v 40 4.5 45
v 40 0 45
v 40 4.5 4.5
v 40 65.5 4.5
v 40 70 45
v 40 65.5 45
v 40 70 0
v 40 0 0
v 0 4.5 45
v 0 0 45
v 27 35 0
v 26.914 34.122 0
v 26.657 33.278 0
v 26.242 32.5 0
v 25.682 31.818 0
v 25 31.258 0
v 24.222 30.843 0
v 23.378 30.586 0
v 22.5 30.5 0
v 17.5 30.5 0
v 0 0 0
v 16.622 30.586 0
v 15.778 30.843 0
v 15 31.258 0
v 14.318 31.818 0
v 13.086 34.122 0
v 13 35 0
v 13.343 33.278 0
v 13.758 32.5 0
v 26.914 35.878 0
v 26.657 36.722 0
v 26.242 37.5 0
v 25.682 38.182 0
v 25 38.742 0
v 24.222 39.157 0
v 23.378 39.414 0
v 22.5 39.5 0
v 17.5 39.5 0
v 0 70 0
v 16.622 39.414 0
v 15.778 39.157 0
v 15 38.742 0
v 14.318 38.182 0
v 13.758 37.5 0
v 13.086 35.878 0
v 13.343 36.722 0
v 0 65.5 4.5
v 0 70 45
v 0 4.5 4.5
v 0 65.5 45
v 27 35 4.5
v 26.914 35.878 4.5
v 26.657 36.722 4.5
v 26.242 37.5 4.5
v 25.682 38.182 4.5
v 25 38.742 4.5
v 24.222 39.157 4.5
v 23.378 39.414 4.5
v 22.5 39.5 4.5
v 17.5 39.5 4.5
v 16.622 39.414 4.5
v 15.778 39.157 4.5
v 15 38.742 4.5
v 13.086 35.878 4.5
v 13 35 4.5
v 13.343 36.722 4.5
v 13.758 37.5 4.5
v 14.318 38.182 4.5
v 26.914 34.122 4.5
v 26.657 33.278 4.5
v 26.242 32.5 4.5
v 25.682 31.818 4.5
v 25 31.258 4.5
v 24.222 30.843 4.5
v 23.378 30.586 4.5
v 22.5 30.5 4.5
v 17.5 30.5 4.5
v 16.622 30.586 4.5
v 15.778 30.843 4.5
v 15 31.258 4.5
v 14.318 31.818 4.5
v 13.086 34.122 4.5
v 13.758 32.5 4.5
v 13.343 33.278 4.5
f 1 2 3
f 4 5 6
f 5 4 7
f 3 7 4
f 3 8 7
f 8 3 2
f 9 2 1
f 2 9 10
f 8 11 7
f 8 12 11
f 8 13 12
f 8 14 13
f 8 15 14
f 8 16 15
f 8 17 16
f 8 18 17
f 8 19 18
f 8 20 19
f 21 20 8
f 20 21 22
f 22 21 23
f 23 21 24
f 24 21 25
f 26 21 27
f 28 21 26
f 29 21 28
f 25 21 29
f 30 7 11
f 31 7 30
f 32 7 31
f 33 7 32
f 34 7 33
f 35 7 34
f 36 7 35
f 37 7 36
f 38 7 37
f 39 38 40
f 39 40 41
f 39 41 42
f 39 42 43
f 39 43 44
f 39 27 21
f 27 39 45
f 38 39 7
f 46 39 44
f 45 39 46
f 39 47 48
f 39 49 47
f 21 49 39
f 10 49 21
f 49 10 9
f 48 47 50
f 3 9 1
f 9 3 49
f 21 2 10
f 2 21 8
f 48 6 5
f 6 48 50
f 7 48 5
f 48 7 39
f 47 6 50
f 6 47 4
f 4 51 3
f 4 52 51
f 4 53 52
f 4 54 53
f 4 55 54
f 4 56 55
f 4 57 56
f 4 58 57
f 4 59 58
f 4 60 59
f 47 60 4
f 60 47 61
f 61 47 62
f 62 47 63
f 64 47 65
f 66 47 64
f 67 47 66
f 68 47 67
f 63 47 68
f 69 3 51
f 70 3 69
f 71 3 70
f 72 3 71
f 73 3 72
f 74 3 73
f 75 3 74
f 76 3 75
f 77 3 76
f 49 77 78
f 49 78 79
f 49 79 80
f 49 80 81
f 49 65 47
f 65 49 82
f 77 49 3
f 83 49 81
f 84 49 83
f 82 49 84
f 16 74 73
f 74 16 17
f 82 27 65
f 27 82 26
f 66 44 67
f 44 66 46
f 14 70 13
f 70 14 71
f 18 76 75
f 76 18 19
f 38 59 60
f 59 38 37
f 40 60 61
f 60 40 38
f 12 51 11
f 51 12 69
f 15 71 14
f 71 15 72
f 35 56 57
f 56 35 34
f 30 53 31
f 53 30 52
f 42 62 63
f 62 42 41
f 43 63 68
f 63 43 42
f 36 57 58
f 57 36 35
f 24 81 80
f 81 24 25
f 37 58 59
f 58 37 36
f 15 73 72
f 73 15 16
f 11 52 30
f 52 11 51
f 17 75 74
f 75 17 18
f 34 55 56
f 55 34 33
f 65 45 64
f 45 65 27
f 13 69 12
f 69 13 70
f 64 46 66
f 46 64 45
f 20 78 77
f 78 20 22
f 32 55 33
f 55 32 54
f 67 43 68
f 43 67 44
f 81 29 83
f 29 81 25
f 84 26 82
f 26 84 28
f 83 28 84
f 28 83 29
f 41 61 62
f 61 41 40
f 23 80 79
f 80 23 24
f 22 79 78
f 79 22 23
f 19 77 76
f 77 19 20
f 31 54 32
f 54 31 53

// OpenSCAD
$fn = 32;

// ----------------------------------------------------------------------
// U-bracket: 40 x 70 x 45 mm
// ----------------------------------------------------------------------

// --- parameters (mm) ---
rail_len = 40;            // outer length, X
jaw_w = 70;               // outer width, Y
jaw_h = 45;               // upright height, Z
web_t = 4.5;              // wall thickness
hole_d = 9;               // clearance for M8
slot_l = 14;              // slot length

module hole_z(px, py) {
  translate([px, py, -2.5]) cylinder(h = web_t + 5, d = hole_d);
}
module hole_y_pz(pz) {
  /* through both uprights along Y */
  translate([0, -2.5, pz]) rotate([-90, 0, 0]) cylinder(h = jaw_w + 5, d = hole_d);
}
module slot_z(px, py) {
  hull() {
    translate([px - (slot_l - hole_d) / 2, py, -2.5]) cylinder(h = web_t + 5, d = hole_d);
    translate([px + (slot_l - hole_d) / 2, py, -2.5]) cylinder(h = web_t + 5, d = hole_d);
  }
}

module base() {
  cube([rail_len, jaw_w, web_t]);
}

module uprights() {
  cube([rail_len, web_t, jaw_h]);
  translate([0, jaw_w - web_t, 0]) cube([rail_len, web_t, jaw_h]);
}

difference() {
  union() {
    base();
    uprights();
  }
  slot_z(20, 35);
}
